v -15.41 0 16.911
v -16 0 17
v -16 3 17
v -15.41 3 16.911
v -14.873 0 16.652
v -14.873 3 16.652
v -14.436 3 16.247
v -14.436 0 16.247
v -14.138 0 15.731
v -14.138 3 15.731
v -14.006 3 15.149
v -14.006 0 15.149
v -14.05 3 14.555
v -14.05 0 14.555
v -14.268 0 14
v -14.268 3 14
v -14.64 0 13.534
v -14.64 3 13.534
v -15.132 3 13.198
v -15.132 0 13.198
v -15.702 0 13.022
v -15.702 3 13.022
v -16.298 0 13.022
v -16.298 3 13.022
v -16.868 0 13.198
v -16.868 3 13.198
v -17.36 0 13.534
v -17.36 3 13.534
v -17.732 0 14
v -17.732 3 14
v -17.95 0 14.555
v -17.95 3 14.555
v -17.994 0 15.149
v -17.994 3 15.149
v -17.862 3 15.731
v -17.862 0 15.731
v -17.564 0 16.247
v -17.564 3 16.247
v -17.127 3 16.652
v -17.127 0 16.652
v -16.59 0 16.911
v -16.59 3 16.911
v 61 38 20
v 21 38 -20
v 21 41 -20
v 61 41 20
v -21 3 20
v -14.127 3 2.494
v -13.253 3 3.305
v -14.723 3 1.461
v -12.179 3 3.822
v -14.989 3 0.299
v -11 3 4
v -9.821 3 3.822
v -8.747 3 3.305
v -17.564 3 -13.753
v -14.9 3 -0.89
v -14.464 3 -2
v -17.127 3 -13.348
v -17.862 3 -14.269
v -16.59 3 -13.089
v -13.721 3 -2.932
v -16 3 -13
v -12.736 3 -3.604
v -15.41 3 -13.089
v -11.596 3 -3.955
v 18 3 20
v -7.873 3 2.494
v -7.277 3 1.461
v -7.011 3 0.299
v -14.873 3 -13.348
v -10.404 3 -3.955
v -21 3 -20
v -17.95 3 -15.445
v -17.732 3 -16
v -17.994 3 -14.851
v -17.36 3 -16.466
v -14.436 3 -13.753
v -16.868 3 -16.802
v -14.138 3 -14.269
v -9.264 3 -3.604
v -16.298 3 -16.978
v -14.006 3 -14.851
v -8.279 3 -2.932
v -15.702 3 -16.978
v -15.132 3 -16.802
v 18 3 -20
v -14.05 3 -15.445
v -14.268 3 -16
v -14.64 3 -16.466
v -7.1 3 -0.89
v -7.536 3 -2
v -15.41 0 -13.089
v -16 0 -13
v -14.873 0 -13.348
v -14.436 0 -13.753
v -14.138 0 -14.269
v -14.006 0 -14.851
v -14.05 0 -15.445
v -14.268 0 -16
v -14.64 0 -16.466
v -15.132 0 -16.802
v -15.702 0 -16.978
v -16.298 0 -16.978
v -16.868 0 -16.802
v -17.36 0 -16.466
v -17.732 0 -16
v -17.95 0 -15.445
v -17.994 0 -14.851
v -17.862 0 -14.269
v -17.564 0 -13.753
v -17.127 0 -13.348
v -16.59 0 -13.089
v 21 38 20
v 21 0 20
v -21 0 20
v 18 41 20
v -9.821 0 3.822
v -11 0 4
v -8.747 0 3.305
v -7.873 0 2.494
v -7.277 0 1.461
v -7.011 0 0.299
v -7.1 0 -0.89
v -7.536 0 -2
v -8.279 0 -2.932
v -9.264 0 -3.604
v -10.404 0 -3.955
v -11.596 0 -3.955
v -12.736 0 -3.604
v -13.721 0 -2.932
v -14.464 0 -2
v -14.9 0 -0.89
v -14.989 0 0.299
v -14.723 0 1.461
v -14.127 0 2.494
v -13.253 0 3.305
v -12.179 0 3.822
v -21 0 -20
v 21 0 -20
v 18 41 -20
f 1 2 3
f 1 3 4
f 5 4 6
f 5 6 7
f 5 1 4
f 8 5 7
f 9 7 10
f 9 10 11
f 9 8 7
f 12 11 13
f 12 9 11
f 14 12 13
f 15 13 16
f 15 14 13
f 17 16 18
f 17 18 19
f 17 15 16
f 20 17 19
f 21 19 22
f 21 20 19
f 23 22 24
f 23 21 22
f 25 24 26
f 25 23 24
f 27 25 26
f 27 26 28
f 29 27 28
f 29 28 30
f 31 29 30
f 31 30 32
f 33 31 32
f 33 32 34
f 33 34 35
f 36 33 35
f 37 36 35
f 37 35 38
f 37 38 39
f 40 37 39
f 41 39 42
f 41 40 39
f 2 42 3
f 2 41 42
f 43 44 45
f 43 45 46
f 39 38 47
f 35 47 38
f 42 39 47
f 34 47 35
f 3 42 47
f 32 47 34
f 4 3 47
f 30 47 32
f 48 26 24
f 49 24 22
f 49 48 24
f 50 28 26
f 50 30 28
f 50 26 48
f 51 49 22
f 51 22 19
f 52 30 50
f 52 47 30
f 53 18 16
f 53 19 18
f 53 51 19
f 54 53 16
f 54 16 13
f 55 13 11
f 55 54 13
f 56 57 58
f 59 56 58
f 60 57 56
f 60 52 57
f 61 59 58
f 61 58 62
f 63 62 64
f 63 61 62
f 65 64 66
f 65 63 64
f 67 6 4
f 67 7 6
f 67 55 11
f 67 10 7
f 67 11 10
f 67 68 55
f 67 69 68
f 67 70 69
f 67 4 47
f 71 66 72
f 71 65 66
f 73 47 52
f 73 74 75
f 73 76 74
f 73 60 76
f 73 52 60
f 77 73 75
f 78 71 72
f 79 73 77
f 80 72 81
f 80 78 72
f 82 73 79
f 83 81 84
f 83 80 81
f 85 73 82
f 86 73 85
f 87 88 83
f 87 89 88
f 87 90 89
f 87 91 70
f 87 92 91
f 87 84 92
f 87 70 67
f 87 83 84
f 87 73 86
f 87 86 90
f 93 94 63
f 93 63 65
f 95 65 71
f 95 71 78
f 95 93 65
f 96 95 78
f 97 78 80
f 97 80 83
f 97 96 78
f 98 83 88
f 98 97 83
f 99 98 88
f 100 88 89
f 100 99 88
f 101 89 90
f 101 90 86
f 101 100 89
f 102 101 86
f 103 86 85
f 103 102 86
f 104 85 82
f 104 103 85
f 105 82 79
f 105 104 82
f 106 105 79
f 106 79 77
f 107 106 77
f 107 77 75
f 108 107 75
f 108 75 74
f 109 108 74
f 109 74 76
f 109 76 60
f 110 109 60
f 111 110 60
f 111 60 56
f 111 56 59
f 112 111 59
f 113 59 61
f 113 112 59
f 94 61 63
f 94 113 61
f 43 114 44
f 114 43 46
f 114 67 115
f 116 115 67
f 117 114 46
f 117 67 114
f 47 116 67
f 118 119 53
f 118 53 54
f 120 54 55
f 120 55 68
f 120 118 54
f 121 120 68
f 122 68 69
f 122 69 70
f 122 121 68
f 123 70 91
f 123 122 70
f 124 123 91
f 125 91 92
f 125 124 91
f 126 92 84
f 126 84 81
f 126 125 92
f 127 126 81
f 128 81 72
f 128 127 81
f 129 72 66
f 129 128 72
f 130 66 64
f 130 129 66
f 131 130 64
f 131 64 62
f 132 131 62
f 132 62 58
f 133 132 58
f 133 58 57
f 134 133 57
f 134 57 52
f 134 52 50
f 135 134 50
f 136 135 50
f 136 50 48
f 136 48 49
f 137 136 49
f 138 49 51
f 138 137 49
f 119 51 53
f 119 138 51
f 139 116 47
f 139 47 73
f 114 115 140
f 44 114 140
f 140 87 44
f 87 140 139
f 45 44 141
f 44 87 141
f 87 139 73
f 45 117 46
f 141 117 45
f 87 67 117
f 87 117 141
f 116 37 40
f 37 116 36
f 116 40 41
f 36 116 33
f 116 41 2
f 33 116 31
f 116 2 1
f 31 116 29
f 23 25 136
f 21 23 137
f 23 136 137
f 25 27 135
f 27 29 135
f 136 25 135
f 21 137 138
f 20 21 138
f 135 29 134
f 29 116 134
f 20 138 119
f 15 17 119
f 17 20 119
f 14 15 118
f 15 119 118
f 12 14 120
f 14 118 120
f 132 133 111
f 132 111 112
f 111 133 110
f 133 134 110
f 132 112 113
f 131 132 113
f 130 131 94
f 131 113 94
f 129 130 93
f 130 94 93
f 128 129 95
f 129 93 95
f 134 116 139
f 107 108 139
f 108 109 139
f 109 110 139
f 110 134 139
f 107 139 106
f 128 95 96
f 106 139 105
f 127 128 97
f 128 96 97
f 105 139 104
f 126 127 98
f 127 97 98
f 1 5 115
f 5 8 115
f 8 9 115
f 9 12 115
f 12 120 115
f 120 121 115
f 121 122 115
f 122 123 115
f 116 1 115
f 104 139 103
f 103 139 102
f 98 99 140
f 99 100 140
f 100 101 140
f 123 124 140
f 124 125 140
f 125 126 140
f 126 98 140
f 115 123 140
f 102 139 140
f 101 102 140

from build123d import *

# Parameters (mm, degrees)
SKETCH1_W           = 42
SKETCH1_H           = 40
SKETCH1_R           = 2
SKETCH1_R_2         = 4
BOSS_EXTRUDE1_DEPTH = 3
SKETCH2_W           = 3
SKETCH2_H           = 40
BOSS_EXTRUDE2_DEPTH = 38
SKETCH3_W           = 40
SKETCH3_H           = 3
BOSS_EXTRUDE3_DEPTH = 40
CUT_EXTRUDE3_DEPTH  = 3


with BuildPart() as part:
    # Sketch1 → Boss-Extrude1 (new body)
    with BuildSketch(Plane(origin=(0, 0, 0), x_dir=(1, 0, 0), z_dir=(0, 1, 0))):
        Rectangle(SKETCH1_W, SKETCH1_H)
        with Locations(Location((-16, 15, 0), (0, 0, 270))):
            Circle(SKETCH1_R, mode=Mode.SUBTRACT)
        with Locations(Location((-16, -15, 0), (0, 0, 270))):
            Circle(SKETCH1_R, mode=Mode.SUBTRACT)
        with Locations(Location((-11, 0, 0), (0, 0, 270))):
            Circle(SKETCH1_R_2, mode=Mode.SUBTRACT)
    extrude(amount=BOSS_EXTRUDE1_DEPTH)

    # Sketch2 → Boss-Extrude2 (add)
    with BuildSketch(Plane(origin=(0, 3, 0), x_dir=(1, 0, 0), z_dir=(0, 1, 0))):
        with Locations((19.5, 0)):
            Rectangle(SKETCH2_W, SKETCH2_H)
    extrude(amount=BOSS_EXTRUDE2_DEPTH)

    # Sketch3 → Boss-Extrude3 (add)
    with BuildSketch(Plane(origin=(21, 0, 0), x_dir=(0, 0, -1), z_dir=(1, 0, 0))):
        with Locations((0, 39.5)):
            Rectangle(SKETCH3_W, SKETCH3_H)
    extrude(amount=BOSS_EXTRUDE3_DEPTH)

    # Sketch8 → Cut-Extrude3 (cut)
    with BuildSketch(Plane.XZ.offset(-38)):
        Polygon((21, -20), (61, 20), (61, -20), align=None)
    extrude(amount=-CUT_EXTRUDE3_DEPTH, mode=Mode.SUBTRACT)


solid = part.part
